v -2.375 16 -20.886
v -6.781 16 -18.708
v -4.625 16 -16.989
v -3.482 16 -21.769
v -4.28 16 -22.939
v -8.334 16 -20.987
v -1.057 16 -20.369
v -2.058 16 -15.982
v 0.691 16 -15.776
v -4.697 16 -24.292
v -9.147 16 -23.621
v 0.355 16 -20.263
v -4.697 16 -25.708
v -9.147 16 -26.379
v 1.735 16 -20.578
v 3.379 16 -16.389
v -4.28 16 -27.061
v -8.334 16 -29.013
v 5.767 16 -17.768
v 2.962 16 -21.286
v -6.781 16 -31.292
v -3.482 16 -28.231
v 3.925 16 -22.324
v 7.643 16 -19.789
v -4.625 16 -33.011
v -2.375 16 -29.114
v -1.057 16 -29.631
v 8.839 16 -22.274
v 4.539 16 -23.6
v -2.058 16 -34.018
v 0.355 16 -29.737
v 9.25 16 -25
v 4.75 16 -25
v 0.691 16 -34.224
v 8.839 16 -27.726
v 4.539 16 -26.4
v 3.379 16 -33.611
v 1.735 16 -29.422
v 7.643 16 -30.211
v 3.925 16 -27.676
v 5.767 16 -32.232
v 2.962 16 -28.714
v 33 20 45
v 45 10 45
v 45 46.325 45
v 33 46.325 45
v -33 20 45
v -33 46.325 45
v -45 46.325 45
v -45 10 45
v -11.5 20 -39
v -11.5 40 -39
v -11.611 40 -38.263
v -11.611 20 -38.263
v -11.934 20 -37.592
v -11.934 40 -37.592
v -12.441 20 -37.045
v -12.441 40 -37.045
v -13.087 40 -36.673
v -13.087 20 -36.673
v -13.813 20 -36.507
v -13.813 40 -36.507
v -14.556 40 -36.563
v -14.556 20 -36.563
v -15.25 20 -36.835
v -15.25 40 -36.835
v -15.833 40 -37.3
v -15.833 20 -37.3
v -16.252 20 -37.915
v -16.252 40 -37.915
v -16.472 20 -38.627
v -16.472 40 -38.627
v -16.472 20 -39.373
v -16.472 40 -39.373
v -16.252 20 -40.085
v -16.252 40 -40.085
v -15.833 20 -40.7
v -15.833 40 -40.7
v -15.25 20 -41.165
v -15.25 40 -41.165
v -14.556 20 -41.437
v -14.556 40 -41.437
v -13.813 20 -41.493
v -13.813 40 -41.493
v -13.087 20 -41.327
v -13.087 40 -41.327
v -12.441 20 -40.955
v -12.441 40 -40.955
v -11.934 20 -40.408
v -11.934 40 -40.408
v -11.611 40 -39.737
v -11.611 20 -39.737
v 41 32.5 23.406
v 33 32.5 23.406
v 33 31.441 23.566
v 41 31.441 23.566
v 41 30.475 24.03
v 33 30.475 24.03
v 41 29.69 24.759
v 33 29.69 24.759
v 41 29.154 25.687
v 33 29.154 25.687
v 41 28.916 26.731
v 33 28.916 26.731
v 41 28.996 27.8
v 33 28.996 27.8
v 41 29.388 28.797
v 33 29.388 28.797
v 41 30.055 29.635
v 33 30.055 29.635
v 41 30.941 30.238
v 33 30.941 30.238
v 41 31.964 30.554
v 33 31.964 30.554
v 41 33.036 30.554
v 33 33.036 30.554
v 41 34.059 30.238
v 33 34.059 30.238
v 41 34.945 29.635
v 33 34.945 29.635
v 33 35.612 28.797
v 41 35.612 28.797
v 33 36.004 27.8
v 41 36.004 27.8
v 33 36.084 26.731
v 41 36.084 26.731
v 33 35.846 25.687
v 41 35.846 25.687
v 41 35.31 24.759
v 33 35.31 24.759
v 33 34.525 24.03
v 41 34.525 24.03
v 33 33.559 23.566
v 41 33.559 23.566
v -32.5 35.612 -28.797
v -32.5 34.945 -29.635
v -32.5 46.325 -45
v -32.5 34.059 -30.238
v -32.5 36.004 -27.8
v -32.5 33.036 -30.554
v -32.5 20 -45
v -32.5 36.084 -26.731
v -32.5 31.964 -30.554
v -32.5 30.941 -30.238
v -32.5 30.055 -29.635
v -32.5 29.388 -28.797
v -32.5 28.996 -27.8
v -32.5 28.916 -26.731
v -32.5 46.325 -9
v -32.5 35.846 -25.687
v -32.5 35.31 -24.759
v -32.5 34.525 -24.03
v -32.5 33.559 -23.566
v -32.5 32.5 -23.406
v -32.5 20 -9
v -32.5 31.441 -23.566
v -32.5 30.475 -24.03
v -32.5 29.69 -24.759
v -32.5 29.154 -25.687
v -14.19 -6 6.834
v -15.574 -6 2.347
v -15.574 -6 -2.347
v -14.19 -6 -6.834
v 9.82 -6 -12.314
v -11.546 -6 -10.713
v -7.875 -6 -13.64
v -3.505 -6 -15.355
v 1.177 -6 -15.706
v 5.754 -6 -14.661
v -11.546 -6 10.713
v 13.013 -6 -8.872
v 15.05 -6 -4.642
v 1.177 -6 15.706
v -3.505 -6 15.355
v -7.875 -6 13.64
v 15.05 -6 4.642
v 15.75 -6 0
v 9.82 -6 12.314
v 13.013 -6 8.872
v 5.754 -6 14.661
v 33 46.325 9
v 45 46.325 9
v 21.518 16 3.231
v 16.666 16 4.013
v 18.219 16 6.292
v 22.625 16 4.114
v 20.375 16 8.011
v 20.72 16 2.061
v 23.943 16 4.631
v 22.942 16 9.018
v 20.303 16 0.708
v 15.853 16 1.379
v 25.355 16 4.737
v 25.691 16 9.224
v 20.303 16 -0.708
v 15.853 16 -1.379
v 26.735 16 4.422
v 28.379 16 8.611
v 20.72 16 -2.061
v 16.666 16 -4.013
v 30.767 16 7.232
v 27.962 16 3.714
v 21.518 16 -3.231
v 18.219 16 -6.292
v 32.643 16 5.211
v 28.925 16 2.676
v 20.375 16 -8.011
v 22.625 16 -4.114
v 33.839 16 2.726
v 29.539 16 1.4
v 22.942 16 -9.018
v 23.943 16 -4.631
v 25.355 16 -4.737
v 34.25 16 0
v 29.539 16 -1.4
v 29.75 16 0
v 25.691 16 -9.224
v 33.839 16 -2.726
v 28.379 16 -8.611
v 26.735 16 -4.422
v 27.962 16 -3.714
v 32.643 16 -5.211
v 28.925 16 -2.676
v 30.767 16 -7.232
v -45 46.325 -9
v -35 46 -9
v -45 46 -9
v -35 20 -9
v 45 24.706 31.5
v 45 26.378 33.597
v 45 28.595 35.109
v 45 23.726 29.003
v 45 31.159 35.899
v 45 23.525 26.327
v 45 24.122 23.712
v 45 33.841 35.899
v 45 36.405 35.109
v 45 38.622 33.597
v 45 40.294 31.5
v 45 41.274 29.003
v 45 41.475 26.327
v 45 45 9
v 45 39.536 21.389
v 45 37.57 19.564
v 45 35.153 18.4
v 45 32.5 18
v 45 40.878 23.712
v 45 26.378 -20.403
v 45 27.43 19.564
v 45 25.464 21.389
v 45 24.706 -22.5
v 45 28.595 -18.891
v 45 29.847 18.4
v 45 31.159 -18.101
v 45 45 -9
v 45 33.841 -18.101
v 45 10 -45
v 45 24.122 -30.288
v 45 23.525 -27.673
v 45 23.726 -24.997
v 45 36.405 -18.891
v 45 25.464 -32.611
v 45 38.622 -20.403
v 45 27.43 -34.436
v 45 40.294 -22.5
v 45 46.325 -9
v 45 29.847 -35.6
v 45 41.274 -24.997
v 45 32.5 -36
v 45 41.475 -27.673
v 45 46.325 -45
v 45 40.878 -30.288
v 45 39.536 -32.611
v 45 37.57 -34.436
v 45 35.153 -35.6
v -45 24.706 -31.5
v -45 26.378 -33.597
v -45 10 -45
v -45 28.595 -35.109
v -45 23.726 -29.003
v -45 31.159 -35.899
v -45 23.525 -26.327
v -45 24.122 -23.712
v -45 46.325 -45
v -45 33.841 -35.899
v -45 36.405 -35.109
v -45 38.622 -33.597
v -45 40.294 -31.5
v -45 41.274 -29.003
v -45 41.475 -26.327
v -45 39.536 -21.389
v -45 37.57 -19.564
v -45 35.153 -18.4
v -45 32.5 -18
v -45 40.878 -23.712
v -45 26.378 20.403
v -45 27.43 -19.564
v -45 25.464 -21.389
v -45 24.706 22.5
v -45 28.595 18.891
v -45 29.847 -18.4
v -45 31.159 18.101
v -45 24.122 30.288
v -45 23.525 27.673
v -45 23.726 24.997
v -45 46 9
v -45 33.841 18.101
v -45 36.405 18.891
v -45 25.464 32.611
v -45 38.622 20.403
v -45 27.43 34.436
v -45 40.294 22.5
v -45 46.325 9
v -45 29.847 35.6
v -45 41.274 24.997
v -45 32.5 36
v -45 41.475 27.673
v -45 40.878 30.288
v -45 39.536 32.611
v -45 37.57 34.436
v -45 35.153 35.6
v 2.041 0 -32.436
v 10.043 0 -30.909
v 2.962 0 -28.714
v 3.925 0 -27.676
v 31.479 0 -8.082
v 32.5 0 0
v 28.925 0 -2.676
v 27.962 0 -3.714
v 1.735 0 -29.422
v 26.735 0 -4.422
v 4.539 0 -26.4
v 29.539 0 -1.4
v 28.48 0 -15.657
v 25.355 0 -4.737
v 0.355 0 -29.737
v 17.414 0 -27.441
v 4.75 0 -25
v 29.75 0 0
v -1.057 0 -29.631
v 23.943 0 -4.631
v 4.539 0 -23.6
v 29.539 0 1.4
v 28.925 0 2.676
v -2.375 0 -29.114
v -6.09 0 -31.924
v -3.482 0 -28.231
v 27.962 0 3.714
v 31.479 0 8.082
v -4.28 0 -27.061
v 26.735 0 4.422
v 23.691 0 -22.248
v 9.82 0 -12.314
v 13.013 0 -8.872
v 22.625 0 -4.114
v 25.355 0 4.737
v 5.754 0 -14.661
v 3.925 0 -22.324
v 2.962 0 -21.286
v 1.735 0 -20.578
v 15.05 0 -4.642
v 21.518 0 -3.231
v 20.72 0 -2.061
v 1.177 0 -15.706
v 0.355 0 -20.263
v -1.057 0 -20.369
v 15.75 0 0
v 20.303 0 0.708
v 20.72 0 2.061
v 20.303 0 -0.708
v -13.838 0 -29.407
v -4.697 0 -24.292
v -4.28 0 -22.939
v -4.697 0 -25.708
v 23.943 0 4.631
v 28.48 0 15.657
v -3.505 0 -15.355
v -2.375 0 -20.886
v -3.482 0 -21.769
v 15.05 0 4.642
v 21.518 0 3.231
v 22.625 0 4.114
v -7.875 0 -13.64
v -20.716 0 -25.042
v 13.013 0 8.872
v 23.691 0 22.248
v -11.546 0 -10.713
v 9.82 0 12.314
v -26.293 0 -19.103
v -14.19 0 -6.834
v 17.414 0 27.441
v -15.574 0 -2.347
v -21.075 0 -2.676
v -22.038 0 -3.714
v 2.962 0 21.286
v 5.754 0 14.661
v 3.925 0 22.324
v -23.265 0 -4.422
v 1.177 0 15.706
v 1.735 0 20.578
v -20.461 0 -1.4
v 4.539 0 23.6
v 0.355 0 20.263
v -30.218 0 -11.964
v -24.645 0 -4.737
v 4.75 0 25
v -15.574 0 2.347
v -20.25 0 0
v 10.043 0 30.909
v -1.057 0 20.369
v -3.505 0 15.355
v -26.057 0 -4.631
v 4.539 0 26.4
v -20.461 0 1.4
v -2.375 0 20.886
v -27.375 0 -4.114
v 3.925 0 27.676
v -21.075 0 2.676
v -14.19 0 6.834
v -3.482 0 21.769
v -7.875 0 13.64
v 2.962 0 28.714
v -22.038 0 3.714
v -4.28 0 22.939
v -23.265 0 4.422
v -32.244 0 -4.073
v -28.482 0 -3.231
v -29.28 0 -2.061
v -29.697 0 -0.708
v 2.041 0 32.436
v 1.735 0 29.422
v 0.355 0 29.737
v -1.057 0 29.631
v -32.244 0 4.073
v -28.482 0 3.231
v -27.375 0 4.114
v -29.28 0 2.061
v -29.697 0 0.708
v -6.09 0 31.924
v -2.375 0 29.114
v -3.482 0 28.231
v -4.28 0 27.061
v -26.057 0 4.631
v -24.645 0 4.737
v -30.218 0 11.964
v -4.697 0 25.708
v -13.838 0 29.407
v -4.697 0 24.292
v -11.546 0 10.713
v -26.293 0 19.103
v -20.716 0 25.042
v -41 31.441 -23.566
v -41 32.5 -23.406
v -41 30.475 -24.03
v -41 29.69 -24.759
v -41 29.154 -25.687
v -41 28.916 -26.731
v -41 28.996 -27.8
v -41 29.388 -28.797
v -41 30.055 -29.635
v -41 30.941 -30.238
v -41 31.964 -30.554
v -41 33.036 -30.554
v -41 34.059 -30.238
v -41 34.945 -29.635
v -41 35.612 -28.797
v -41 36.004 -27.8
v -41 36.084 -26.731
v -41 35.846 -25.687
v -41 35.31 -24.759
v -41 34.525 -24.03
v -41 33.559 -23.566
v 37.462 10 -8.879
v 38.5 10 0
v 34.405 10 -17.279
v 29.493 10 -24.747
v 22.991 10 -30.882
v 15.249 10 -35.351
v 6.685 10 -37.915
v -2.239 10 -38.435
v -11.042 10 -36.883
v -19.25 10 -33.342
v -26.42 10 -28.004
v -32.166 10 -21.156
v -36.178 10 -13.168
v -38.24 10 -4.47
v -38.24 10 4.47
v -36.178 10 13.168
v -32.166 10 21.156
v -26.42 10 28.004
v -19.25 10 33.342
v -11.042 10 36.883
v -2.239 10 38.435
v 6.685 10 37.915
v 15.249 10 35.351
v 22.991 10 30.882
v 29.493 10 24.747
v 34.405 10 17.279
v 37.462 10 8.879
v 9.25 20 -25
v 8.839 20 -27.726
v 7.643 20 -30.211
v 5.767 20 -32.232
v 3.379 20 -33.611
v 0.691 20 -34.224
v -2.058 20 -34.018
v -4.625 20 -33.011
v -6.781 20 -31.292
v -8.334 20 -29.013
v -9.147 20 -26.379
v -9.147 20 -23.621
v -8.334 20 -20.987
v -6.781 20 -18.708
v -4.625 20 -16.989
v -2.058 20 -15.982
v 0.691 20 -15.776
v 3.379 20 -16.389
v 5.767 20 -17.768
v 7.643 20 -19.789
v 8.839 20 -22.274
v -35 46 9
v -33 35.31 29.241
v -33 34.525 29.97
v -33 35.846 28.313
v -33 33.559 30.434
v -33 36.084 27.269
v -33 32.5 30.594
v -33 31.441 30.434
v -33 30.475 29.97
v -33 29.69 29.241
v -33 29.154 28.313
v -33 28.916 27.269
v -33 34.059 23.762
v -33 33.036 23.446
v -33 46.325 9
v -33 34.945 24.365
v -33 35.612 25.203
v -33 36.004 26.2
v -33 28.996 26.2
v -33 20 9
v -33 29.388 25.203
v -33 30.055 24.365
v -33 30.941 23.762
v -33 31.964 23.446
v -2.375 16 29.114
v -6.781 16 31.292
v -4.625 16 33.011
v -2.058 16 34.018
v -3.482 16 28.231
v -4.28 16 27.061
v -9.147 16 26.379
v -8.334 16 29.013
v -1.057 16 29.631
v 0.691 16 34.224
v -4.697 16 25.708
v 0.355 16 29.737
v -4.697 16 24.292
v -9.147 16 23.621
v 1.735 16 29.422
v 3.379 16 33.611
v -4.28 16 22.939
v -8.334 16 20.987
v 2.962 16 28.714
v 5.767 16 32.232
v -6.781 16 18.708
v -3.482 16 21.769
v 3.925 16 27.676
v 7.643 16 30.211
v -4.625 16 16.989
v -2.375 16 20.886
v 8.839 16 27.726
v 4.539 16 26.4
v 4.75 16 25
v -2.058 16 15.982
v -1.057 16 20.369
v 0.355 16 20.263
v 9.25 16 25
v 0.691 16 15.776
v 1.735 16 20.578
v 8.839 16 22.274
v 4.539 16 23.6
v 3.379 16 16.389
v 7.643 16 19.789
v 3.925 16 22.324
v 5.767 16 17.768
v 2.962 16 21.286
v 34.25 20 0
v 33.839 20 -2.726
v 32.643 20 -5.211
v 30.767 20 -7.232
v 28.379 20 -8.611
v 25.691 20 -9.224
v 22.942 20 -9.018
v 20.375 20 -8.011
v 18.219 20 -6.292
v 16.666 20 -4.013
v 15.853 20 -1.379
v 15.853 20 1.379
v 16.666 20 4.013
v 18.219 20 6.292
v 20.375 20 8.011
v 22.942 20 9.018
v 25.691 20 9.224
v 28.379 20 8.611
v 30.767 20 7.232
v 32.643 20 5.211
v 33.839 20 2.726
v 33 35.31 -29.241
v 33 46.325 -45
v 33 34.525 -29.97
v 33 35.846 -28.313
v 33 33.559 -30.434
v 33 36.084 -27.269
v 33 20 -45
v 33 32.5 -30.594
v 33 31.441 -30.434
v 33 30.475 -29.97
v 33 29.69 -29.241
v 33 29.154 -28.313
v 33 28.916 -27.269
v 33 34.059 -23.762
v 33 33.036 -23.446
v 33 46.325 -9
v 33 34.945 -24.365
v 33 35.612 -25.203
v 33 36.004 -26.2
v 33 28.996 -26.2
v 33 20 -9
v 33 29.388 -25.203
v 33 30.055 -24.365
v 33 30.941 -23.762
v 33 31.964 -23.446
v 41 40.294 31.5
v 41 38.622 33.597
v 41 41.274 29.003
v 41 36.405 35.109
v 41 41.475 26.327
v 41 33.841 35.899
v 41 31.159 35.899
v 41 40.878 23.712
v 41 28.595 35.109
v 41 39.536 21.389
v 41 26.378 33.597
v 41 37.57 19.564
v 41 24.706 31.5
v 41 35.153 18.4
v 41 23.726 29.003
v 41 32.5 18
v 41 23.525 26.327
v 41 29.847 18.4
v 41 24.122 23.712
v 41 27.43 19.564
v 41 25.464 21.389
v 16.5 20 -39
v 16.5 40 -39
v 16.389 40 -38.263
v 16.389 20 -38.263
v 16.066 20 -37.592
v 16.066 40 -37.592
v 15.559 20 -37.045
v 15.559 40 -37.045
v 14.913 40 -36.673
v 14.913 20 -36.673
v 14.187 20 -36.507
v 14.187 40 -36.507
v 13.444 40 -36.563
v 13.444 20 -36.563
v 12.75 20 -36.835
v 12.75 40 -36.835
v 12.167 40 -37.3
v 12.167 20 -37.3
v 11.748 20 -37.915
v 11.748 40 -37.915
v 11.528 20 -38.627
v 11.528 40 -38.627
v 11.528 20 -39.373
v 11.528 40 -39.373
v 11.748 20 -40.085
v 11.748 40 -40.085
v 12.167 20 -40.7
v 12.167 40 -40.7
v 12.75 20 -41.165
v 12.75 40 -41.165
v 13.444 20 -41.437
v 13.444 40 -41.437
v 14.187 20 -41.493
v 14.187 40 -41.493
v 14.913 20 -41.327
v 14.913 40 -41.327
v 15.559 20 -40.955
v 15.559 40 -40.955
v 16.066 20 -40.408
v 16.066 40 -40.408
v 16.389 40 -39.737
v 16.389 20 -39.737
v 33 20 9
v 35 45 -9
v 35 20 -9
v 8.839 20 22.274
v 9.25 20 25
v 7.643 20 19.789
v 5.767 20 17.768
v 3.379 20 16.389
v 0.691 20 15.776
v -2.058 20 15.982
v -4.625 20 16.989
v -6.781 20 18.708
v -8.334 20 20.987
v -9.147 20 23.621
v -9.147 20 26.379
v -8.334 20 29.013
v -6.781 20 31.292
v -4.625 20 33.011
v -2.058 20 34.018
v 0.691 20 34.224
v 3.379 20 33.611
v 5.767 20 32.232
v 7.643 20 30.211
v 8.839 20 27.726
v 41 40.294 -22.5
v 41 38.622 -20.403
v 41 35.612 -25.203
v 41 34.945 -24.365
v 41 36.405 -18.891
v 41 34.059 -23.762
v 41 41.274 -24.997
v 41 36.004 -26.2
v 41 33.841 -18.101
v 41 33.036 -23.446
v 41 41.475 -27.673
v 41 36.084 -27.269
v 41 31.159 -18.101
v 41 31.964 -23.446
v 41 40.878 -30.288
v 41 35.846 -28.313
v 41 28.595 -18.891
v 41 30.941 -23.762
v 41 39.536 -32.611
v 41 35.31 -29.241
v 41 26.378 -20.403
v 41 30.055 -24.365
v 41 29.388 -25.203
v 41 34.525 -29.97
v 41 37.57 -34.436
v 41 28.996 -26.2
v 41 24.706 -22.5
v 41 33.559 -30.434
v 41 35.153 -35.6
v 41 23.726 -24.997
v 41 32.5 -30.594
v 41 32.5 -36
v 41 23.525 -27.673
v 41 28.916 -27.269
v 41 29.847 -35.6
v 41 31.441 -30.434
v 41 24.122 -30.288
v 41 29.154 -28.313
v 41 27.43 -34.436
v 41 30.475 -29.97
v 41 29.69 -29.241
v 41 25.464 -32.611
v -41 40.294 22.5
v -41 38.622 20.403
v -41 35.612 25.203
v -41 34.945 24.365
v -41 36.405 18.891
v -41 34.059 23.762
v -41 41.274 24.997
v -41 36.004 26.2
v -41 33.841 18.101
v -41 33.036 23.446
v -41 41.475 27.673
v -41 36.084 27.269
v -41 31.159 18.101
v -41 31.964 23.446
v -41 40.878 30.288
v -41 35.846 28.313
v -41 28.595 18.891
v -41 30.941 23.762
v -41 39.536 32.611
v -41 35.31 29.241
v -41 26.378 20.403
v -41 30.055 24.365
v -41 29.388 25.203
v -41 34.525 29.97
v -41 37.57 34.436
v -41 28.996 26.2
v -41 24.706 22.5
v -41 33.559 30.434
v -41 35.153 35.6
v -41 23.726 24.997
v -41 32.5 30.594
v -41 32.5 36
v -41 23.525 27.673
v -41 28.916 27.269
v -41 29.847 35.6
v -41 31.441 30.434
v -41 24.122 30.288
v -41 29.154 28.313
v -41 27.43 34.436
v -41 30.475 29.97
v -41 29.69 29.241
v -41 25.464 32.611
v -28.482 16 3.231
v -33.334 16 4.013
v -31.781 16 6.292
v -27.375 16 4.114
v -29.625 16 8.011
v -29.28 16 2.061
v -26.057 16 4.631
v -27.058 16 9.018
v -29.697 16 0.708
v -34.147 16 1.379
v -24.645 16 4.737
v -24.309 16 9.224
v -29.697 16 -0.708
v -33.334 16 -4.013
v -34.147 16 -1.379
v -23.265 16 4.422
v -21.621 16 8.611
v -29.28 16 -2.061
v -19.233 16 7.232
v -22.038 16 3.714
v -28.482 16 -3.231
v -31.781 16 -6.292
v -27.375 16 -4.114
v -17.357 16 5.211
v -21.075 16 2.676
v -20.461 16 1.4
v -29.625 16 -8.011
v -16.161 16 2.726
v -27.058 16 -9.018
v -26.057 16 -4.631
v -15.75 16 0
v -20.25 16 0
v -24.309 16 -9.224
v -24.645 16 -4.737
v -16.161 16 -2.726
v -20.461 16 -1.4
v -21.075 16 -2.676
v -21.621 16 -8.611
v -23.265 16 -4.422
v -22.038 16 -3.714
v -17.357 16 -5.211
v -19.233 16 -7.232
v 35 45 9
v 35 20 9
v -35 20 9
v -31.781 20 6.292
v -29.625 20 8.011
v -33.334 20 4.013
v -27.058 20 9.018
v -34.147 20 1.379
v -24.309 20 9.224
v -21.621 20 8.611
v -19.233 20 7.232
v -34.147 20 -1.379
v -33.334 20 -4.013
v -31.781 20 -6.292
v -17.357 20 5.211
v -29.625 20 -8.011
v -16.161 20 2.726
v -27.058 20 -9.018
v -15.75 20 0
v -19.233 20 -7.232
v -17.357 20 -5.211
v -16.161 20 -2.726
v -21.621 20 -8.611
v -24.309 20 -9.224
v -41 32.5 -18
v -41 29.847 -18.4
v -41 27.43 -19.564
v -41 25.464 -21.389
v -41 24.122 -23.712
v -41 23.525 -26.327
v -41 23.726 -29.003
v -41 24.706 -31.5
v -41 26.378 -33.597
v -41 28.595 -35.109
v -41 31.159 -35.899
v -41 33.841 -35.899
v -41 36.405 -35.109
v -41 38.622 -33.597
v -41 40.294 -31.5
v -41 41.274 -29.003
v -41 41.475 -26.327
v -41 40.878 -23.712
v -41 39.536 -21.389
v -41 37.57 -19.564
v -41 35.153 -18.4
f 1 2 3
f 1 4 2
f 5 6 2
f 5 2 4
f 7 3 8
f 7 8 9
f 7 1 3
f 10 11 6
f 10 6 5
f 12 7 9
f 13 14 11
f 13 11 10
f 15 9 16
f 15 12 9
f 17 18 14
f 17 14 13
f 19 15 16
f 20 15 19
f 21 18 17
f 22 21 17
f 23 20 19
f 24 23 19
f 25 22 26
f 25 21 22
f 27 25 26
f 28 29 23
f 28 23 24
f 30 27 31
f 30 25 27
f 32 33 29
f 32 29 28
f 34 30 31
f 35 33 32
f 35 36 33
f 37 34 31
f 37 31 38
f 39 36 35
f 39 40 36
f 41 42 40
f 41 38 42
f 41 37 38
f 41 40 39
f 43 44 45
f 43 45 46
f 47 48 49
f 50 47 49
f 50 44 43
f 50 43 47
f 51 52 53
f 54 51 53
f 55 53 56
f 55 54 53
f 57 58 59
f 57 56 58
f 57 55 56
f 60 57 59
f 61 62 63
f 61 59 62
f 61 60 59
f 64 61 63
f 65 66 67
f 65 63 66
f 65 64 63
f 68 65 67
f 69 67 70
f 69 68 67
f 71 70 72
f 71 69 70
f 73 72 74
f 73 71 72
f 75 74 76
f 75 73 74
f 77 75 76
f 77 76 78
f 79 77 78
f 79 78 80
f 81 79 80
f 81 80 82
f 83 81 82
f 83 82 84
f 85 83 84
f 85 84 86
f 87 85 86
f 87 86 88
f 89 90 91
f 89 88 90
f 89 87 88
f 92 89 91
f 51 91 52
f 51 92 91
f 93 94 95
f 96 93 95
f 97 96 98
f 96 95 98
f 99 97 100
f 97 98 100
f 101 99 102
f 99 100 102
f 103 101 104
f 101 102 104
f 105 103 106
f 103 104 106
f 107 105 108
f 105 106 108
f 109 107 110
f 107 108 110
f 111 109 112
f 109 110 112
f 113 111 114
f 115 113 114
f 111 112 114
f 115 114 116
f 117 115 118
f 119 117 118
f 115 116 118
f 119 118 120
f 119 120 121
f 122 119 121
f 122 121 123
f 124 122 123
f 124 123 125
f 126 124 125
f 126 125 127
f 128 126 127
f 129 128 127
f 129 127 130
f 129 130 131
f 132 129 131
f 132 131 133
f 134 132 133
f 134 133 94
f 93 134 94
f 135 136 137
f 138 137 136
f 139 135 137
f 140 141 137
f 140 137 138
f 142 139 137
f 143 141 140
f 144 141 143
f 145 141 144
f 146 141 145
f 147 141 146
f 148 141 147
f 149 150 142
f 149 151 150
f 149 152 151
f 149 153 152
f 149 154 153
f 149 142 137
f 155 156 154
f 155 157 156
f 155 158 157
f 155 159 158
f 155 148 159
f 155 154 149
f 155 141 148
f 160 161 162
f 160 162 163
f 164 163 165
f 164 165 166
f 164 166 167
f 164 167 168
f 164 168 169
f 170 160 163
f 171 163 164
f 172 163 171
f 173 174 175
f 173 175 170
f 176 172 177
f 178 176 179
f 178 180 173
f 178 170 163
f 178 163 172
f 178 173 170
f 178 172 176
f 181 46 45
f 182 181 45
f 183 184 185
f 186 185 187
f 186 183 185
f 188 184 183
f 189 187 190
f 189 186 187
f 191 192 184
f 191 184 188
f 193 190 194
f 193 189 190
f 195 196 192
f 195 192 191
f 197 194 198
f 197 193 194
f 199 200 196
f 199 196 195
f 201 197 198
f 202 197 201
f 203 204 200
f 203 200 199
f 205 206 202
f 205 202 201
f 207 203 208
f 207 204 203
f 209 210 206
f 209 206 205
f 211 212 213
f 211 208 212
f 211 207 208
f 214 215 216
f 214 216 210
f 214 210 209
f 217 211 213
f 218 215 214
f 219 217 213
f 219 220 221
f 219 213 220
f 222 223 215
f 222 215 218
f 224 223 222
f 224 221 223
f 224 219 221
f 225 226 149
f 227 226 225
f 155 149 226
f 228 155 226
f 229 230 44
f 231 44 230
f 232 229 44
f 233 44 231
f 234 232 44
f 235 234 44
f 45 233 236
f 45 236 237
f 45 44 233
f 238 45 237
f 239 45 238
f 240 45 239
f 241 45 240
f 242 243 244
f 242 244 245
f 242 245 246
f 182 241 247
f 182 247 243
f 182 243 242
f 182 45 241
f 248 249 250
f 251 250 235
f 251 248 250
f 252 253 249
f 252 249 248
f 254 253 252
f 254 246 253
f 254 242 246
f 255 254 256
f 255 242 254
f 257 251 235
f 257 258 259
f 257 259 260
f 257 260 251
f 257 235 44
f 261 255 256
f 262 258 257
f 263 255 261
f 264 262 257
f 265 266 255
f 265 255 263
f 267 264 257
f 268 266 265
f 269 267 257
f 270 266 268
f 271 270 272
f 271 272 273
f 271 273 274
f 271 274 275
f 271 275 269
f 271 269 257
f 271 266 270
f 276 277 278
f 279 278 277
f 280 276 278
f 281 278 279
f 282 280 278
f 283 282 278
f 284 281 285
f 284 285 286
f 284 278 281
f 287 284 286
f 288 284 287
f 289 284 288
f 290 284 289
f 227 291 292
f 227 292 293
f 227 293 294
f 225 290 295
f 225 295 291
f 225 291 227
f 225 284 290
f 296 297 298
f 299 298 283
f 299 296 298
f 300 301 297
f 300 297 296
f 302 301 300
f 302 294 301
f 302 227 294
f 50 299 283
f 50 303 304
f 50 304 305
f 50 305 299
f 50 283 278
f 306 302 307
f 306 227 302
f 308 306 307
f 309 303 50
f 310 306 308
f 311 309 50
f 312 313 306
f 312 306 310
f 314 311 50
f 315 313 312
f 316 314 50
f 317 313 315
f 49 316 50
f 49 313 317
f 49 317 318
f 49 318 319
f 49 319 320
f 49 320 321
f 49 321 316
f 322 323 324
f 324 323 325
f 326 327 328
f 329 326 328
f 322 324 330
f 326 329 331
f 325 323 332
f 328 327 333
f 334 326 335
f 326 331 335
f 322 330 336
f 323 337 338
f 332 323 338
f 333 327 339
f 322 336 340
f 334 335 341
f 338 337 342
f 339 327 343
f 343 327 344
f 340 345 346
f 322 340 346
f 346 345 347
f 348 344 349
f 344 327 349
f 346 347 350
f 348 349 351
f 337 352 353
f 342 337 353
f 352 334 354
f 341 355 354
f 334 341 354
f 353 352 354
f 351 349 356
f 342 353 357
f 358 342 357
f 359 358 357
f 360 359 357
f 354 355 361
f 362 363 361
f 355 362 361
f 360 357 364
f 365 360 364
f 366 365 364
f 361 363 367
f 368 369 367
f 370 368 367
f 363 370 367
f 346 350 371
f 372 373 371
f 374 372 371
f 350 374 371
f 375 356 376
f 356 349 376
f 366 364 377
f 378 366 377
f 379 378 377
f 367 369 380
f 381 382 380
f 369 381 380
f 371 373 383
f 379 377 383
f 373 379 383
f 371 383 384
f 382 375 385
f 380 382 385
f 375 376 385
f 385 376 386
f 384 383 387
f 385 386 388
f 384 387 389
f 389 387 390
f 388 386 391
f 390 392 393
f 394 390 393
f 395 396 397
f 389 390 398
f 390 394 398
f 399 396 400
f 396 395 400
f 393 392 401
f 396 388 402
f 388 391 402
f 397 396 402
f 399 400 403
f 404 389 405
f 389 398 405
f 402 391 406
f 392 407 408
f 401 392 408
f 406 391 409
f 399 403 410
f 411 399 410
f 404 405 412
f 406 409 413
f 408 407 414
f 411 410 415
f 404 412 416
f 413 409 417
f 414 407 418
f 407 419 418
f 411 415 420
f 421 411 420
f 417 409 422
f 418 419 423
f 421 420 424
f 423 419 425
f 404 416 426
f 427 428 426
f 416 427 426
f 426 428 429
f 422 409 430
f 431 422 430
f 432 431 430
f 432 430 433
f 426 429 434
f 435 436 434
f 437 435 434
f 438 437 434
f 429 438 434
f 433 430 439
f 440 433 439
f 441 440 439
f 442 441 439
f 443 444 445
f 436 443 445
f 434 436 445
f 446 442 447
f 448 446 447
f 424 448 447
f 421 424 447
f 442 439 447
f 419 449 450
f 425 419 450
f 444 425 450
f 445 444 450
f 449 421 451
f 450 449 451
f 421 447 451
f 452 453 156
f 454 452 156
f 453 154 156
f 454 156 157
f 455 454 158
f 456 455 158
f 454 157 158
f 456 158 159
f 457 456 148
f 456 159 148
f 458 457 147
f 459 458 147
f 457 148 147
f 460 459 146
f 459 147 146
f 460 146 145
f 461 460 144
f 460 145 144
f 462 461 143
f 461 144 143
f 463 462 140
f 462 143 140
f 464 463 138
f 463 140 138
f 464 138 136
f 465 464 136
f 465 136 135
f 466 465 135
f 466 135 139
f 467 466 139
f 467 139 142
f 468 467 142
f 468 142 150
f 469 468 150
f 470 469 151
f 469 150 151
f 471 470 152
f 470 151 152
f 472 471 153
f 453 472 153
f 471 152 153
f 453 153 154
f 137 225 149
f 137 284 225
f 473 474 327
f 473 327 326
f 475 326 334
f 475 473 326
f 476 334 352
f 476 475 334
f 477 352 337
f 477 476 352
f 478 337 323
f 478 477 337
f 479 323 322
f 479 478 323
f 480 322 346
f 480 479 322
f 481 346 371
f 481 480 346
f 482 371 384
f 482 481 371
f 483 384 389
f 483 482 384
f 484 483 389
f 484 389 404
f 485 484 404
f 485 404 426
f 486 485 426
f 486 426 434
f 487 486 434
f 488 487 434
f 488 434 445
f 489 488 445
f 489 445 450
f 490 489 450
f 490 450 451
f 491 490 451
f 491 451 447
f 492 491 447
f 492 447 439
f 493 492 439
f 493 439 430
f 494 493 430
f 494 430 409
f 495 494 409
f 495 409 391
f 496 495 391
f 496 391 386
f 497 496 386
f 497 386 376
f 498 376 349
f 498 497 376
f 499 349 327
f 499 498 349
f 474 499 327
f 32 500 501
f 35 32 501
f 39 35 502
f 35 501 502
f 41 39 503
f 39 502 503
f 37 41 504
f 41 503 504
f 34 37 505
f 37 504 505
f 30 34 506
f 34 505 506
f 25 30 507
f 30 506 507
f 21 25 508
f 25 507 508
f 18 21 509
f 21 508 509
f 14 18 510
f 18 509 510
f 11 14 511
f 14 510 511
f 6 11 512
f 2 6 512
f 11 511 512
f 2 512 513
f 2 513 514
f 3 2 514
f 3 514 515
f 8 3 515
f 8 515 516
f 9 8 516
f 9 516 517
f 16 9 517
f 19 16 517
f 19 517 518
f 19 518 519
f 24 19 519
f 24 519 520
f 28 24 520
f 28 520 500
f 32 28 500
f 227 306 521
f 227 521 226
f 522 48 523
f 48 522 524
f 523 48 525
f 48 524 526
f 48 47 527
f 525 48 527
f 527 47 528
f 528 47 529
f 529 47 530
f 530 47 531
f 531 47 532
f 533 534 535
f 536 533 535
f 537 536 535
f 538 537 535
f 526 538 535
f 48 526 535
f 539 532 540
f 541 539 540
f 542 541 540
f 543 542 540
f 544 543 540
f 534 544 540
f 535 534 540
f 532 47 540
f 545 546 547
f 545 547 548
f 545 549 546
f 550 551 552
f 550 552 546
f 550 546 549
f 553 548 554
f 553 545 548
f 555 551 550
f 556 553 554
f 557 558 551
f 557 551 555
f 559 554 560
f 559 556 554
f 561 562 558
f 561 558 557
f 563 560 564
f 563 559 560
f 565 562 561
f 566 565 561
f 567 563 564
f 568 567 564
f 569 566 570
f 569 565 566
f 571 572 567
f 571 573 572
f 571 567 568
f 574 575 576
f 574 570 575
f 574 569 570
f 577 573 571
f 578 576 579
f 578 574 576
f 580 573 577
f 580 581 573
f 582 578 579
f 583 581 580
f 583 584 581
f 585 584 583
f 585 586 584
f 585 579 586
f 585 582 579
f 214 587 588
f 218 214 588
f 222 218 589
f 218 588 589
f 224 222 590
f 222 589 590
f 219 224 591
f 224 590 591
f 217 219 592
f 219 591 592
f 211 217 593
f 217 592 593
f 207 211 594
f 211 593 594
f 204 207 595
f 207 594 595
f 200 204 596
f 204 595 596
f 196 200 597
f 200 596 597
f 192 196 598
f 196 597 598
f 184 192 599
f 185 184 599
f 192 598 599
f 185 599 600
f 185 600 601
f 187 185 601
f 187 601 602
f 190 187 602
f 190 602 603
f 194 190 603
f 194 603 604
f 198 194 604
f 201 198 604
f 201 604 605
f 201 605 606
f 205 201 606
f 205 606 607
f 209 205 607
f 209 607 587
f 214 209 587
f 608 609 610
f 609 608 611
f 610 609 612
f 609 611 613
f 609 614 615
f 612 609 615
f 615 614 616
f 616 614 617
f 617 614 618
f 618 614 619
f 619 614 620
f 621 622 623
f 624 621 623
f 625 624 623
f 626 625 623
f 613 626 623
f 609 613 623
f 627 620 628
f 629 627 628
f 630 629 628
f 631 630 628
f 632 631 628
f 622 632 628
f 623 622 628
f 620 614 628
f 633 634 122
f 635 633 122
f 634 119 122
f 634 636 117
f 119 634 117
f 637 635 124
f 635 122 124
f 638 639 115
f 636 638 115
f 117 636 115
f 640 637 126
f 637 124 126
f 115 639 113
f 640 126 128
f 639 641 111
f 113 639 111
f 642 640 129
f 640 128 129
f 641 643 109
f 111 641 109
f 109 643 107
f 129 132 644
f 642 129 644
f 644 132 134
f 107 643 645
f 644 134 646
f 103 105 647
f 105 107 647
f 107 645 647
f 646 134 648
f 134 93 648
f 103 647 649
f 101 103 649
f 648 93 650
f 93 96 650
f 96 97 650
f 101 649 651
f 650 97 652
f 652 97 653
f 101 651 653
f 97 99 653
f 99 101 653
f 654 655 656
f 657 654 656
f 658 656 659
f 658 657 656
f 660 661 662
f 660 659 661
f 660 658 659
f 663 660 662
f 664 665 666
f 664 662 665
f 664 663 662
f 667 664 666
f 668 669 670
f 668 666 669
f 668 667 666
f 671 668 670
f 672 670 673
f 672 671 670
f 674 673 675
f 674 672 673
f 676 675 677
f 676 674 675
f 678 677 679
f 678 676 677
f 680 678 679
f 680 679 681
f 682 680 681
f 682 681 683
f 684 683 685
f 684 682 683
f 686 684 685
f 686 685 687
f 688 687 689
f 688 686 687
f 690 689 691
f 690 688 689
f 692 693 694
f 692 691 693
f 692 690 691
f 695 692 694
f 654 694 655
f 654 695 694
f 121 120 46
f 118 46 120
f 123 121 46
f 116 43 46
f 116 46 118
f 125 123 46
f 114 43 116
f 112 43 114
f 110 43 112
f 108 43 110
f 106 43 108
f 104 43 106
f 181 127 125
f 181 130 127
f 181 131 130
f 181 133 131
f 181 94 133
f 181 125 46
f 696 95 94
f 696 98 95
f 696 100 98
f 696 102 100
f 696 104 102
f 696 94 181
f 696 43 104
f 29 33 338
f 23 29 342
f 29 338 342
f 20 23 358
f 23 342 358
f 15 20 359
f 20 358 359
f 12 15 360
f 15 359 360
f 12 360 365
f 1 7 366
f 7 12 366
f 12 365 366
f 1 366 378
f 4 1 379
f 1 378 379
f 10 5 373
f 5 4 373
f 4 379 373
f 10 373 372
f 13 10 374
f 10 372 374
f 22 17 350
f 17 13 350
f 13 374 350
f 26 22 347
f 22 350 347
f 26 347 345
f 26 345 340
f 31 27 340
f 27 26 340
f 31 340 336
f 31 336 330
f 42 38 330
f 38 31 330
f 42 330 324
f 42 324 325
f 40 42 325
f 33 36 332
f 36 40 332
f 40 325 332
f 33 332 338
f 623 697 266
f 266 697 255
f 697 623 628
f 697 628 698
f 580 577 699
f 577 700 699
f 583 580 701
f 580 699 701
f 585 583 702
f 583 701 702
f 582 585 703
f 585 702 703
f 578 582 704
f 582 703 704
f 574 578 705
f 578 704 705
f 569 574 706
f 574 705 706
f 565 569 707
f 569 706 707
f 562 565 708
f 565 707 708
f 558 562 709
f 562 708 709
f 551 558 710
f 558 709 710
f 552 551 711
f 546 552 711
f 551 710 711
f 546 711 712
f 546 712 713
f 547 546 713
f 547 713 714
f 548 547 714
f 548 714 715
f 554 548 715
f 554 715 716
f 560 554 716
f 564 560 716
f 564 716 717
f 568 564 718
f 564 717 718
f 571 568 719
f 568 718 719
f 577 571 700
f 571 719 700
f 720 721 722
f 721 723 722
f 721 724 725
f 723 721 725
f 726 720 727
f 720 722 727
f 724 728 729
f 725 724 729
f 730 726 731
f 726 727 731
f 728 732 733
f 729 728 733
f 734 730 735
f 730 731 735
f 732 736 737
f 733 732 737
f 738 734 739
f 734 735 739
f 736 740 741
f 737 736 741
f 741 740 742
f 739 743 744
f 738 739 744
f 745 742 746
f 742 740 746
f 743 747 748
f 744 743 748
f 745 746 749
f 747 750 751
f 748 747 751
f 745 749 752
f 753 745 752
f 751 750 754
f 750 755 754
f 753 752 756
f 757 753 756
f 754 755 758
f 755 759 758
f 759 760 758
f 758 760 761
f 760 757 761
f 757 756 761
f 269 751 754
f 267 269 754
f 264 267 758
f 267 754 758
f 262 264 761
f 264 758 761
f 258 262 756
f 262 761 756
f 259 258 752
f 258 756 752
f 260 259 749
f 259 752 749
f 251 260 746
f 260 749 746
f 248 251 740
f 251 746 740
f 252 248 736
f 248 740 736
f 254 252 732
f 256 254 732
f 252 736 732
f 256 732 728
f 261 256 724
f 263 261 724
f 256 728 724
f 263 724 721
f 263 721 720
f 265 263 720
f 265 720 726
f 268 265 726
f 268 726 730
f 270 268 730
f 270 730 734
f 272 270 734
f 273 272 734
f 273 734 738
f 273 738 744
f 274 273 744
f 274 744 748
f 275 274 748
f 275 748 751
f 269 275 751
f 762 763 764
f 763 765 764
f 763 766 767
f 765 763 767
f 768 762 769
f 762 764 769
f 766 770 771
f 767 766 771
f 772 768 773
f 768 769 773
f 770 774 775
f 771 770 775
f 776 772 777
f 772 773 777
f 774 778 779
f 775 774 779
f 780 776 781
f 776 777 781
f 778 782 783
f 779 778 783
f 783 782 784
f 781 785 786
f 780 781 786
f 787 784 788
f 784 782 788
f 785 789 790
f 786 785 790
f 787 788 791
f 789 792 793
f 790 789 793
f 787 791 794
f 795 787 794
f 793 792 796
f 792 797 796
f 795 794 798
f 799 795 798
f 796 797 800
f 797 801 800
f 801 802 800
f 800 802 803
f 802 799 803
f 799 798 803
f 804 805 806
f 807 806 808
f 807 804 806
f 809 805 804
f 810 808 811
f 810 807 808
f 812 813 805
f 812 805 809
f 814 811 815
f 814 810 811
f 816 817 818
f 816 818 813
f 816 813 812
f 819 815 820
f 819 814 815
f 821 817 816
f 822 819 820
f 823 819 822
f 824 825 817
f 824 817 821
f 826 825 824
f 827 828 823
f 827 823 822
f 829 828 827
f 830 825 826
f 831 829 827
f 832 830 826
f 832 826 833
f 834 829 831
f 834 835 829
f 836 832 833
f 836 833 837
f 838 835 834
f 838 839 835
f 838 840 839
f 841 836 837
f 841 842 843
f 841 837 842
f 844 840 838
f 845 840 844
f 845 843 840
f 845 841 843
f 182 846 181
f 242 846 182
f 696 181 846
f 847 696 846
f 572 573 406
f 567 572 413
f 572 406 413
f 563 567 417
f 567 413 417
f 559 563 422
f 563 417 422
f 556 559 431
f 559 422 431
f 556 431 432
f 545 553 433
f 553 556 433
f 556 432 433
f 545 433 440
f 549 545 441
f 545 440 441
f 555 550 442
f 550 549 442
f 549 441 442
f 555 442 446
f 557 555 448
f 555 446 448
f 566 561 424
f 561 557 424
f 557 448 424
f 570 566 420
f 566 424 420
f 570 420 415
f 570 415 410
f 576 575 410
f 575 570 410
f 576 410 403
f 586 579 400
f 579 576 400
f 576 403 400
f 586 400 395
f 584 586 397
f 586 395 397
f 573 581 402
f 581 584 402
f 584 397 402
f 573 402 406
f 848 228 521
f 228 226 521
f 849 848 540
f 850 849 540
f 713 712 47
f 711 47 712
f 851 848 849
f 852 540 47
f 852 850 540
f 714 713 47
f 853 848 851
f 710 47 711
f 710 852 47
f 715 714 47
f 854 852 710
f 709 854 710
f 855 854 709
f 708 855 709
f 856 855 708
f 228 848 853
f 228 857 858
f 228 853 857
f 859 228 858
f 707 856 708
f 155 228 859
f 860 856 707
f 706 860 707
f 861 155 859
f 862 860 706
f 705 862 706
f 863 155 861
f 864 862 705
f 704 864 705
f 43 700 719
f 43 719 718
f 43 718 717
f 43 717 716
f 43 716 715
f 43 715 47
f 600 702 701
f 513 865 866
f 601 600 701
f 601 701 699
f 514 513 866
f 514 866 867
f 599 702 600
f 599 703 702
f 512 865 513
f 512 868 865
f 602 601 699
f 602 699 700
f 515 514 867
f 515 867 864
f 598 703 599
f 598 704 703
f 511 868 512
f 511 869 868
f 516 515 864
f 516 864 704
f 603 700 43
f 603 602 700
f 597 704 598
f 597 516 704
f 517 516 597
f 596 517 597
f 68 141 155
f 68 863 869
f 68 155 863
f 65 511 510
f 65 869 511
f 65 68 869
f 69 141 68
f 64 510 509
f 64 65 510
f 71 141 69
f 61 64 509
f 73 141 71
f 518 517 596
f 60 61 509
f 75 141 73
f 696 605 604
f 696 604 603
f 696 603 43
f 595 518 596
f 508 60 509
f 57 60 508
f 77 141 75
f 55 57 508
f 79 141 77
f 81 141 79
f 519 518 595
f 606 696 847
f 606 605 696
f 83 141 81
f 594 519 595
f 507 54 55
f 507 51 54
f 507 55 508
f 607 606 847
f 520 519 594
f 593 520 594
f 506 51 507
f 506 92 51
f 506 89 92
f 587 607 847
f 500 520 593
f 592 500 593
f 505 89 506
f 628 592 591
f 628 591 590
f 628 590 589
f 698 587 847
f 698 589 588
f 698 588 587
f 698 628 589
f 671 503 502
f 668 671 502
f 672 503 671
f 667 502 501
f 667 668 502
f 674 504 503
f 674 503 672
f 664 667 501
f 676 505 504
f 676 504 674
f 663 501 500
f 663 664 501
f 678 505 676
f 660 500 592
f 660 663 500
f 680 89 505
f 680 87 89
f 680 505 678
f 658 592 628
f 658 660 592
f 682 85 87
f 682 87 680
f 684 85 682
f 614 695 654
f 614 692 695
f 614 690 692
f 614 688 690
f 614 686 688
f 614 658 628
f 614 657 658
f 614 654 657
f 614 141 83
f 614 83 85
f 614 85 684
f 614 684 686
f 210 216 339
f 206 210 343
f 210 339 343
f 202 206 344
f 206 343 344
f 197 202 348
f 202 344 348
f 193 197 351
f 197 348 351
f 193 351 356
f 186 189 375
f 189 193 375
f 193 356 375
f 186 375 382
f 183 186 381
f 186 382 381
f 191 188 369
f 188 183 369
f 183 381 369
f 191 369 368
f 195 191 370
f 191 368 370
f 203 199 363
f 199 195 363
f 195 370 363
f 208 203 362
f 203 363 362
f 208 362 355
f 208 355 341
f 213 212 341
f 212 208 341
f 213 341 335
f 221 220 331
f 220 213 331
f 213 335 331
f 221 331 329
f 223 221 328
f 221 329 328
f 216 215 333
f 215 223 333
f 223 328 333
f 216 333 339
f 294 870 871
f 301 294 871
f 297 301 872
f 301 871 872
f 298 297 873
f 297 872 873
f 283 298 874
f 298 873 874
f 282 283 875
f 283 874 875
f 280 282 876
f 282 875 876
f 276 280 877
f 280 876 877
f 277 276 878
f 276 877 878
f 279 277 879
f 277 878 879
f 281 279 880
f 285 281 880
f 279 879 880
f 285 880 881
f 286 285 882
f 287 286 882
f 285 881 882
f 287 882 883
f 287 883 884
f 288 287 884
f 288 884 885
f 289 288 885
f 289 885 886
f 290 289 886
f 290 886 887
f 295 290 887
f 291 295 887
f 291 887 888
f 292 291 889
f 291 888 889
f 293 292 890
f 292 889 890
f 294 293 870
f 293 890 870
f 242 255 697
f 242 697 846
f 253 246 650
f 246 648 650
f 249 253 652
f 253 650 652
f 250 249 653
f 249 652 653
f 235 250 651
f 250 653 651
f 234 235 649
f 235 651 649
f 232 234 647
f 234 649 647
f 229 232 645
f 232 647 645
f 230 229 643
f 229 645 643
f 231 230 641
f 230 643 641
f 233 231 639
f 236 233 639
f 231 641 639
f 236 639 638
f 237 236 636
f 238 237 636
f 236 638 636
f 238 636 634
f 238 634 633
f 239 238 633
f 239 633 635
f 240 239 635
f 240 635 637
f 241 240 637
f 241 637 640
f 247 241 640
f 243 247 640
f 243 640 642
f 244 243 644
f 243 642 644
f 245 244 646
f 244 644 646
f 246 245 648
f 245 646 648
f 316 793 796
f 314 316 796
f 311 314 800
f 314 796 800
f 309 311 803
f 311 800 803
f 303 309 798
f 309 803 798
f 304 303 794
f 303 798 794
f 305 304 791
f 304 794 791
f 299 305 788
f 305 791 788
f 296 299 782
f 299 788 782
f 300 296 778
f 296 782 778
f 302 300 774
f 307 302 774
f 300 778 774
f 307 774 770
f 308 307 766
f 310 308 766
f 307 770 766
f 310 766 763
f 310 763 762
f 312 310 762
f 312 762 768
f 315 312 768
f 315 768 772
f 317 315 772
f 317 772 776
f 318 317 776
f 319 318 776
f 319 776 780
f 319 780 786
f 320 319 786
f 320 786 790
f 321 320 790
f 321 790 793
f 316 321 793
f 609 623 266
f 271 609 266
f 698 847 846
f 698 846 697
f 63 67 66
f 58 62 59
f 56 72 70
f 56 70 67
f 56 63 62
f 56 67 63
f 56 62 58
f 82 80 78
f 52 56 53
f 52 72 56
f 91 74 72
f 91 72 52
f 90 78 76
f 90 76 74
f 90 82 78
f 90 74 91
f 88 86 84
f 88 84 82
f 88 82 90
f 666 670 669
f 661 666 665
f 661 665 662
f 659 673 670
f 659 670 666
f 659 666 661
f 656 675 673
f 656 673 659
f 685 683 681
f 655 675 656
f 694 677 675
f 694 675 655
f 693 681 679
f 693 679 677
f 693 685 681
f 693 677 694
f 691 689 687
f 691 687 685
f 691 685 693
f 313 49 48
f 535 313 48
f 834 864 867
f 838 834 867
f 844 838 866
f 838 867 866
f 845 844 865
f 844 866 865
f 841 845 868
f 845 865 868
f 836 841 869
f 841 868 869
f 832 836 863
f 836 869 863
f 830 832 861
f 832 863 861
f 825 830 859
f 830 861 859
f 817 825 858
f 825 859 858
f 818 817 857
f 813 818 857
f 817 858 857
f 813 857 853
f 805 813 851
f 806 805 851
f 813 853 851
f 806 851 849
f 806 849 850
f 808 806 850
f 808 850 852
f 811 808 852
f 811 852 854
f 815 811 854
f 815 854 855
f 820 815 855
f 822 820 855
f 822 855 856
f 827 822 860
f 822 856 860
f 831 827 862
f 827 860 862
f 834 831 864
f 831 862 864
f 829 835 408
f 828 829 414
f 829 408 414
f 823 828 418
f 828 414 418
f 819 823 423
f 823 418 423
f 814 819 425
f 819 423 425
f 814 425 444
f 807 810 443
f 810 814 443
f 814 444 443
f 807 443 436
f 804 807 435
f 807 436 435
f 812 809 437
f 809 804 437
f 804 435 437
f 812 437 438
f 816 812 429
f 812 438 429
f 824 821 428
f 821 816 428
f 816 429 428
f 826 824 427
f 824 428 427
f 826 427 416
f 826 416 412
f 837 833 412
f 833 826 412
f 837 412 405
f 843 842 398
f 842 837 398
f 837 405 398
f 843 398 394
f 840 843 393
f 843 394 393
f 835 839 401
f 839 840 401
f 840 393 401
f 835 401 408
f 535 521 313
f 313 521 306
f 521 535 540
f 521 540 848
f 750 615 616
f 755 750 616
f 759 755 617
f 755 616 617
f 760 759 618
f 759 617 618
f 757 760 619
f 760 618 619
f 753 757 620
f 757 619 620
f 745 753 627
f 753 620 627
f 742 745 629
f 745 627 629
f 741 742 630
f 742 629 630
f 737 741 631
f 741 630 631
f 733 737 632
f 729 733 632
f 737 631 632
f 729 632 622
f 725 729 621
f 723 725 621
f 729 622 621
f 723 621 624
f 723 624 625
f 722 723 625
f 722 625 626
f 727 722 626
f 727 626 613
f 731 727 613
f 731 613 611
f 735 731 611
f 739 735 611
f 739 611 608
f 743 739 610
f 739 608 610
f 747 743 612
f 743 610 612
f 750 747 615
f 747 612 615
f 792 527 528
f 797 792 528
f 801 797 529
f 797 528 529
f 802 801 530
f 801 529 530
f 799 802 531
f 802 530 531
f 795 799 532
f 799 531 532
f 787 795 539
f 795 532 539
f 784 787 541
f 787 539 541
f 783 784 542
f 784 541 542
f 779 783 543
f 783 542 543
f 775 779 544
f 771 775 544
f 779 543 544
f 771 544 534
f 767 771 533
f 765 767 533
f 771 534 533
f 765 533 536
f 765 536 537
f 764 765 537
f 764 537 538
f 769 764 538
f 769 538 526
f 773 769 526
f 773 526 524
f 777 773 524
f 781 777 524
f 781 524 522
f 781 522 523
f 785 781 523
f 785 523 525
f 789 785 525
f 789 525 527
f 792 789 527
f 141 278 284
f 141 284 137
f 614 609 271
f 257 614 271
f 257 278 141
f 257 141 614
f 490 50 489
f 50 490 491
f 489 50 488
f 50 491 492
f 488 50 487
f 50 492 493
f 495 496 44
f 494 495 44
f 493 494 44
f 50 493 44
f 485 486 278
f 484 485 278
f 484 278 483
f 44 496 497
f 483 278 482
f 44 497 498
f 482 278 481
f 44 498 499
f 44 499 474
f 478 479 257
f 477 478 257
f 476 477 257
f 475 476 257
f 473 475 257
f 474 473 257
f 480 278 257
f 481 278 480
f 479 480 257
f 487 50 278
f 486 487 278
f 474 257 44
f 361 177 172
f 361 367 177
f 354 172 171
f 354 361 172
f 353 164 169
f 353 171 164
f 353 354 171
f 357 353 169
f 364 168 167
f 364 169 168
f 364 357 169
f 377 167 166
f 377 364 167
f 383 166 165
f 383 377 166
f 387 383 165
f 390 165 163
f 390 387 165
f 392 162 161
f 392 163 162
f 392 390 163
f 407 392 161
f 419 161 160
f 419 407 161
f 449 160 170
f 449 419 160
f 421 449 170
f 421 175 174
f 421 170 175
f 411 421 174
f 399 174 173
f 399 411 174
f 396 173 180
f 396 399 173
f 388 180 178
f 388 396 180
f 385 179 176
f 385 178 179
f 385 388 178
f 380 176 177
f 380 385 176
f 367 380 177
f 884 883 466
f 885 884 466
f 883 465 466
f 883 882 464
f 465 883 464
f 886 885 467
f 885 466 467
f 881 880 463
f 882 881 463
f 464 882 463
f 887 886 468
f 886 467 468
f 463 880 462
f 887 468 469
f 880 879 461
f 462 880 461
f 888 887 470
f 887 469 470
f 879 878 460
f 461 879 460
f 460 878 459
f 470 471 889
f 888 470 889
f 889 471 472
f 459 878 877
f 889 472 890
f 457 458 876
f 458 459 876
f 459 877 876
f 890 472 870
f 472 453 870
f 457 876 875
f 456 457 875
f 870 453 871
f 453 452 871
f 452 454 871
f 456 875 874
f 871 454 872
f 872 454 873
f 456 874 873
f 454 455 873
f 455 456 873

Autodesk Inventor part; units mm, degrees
ref_plane "YZ Plane" through (0, 0, 0) normal (1, 0, 0) x (0, 1, 0)
ref_plane "XZ Plane" through (0, 0, 0) normal (0, 1, 0) x (-1, 0, 0)
ref_plane "XY Plane" through (0, 0, 0) normal (0, 0, 1) x (1, 0, 0)
sketch "Szkic1" plane through (0, 0, 0) normal (0, 1, 0) x (-1, 0, 0)
  circle A0 centre (0, 0) radius 32.5
  dimension "d0" = 65
extrude "Wyciągnięcie proste1" add sketch "Szkic1" along normal blind 10
sketch "Szkic2" plane through (0, 10, 0) normal (0, 1, 0) x (1, 0, 0)
  circle A0 centre (0, 0) radius 15.75
  circle A1 centre (0, 25) radius 4.75
  circle A2 centre (-25, 0) radius 4.75
  circle A3 centre (0, -25) radius 4.75
  circle A4 centre (25, 0) radius 4.75
  dimension "d3" = 31.5
  dimension "d4" = 9.5
  dimension "d5" = 25
  dimension "d8" = 360
extrude "Wyciągnięcie proste2" cut sketch "Szkic2" against normal blind 23.25 contours A1 | A2 | A3 | A4
sketch "Szkic3" plane through (0, 0, 0) normal (0, -1, 0) x (1, 0, 0)
  circle A0 centre (0, 0) radius 15.75
  dimension "d12" = 31.5
extrude "Wyciągnięcie proste3" add sketch "Szkic3" along normal blind 6
sketch "Szkic4" plane through (0, 10, 0) normal (0, 1, 0) x (1, 0, 0)
  line L0 (-45, 45) -> (45, 45)
  line L1 (45, 45) -> (45, -45)
  line L2 (45, -45) -> (-45, -45)
  line L3 (-45, -45) -> (-45, 45)
  point P0 (0, 0)
  point P1 (0, 45)
  point P2 (45, 0)
  dimension "d15" = 90
  dimension "d16" = 90
extrude "Wyciągnięcie proste4" add sketch "Szkic4" along normal blind 10
sketch "Szkic5" plane through (0, 10, 0) normal (0, -1, 0) x (1, 0, 0)
  circle A0 centre (-25, 0) radius 4.75 projected
  circle A1 centre (0, 25) radius 4.75 projected
  circle A2 centre (25, 0) radius 4.75 projected
  circle A3 centre (0, -25) radius 4.75 projected
  point P0 (0, 0)
extrude "Wyciągnięcie proste5" cut sketch "Szkic5" along normal mid plane 50
sketch "Szkic6" plane through (0, 20, 0) normal (0, 1, 0) x (1, 0, 0)
  circle A0 centre (0, 25) radius 4.75 projected
  circle A1 centre (25, 0) radius 4.75 projected
  circle A2 centre (-25, 0) radius 4.75 projected
  circle A3 centre (0, -25) radius 4.75 projected
  circle A4 centre (-25, 0) radius 9.25
  circle A5 centre (0, 0) radius 15.75 projected
  circle A6 centre (0, 25) radius 9.25
  circle A7 centre (25, 0) radius 4.75 projected
  circle A8 centre (25, 0) radius 9.25
  circle A9 centre (0, -25) radius 9.25
extrude "Wyciągnięcie proste6" cut sketch "Szkic6" against normal blind 4 contours A4 | A6 | A8 | A9
sketch "Szkic7" plane through (0, 10, 0) normal (0, -1, 0) x (1, 0, 0)
  circle A0 centre (0, 0) radius 38.5
  dimension "d29" = 77
sketch "Szkic8" plane through (0, 0, 0) normal (0, -1, 0) x (1, 0, 0)
  circle A0 centre (0, 0) radius 32.5
loft "Wyciągnięcie złożone1" add profiles "Szkic7" section 2 edges at (32.5, 0, 0)
sketch "Szkic9" plane through (0, 0, 0) normal (0, -1, 0) x (1, 0, 0)
  circle A0 centre (0, -25) radius 4.75 projected
  circle A1 centre (-25, 0) radius 4.75 projected
  circle A2 centre (0, 25) radius 4.75 projected
  circle A3 centre (25, 0) radius 4.75 projected
  point P0 (0, 0)
extrude "Wyciągnięcie proste7" cut sketch "Szkic9" against normal blind 30
sketch "Szkic10" plane through (0, 20, 0) normal (0, 1, 0) x (1, 0, 0)
  line L0 (-45, -45) -> (-45, 45) projected
  line L1 (-45, -45) -> (-33, -45)
  line L2 (-33, -45) -> (-33, -9)
  line L3 (-33, -9) -> (-45, -9)
  line L4 (-45, -9) -> (-45, -45)
  line L5 (-45, 45) -> (-32.5, 45)
  line L6 (-32.5, 45) -> (-32.5, 9)
  line L7 (-32.5, 9) -> (-45, 9)
  line L8 (-45, 9) -> (-45, 45)
  line L9 (45, -45) -> (-45, -45) projected
  line L10 (45, -45) -> (33, -45)
  line L11 (33, -45) -> (33, -9)
  line L12 (33, -9) -> (45, -9)
  line L13 (45, -9) -> (45, -45)
  line L14 (45, 45) -> (33, 45)
  line L15 (33, 45) -> (33, 9)
  line L16 (33, 9) -> (45, 9)
  line L17 (45, 9) -> (45, 45)
  point P0 (0, 0)
  dimension "d30" = 12
  dimension "d31" = 36
extrude "Wyciągnięcie proste8" add sketch "Szkic10" along normal blind 26.325
sketch "Szkic11" plane through (45, 10, 45) normal (1, 0, 0) x (0, 0, -1)
  circle A0 centre (18, 22.5) radius 5
  circle A1 centre (72, 22.5) radius 5
  point P0 (45, -10)
  dimension "d34" = 10
  dimension "d35" = 10
sketch "Szkic12" plane through (-45, 10, -45) normal (-1, 0, 0) x (0, 0, 1)
  circle A0 centre (18, 22.5) radius 5
  circle A1 centre (72, 22.5) radius 5
  point P0 (45, -10)
  dimension "d36" = 10
  dimension "d37" = 10
sketch "Szkic13" plane through (-45, 10, -45) normal (-1, 0, 0) x (0, 0, 1)
  point P0 (45, -10)
sketch "Szkic14" plane through (-45, 10, -45) normal (-1, 0, 0) x (0, 0, 1)
  line L0 (36, 10) -> (54, 10) projected
  line L1 (36, 10) -> (54, 10)
  line L2 (54, 10) -> (54, 36)
  line L3 (54, 36) -> (36, 36)
  line L4 (36, 36) -> (36, 10)
  point P0 (45, -10)
extrude "Wyciągnięcie proste9" add sketch "Szkic14" against normal blind 10
sketch "Szkic15" plane through (45, 10, 45) normal (1, 0, 0) x (0, 0, -1)
  line L0 (36, 10) -> (36, 36.325) projected
  line L1 (54, 10) -> (54, 36.325) projected
  line L2 (36, 10) -> (54, 10)
  line L3 (54, 10) -> (54, 35)
  line L4 (54, 35) -> (36, 35)
  line L5 (36, 35) -> (36, 10)
  point P0 (45, -10)
extrude "Wyciągnięcie proste10" add sketch "Szkic15" against normal blind 10
hole "Otwór1" at (45, 32.5, 27) at (45, 32.5, -27) direction (-1, 0, 0) diameter 7.188 depth 24 tip angle 118 counterbore diameter 18 counterbore depth 4 thread size "M8x0.75" class "6H" standard "ISO Metric profile"
hole "Otwór2" at (-45, 32.5, -27) at (-45, 32.5, 27) direction (1, 0, 0) diameter 7.188 depth 20 tip angle 118 counterbore diameter 18 counterbore depth 4 thread size "M8x0.75" class "6H" standard "ISO Metric profile"
sketch "Szkic16" plane through (0, 20, 0) normal (0, 1, 0) x (1, 0, 0)
  circle A0 centre (14, 39) radius 2.5
  circle A1 centre (-14, 39) radius 2.5
  point P0 (0, 0)
  dimension "d56" = 5
  dimension "d57" = 5
extrude "Wyciągnięcie proste11" add sketch "Szkic16" along normal blind 20
sketch "Szkic17" plane through (0, 20, 0) normal (0, 1, 0) x (1, 0, 0)
  point P0 (0, 0)
properties part number "polaczenie_CH-R"
